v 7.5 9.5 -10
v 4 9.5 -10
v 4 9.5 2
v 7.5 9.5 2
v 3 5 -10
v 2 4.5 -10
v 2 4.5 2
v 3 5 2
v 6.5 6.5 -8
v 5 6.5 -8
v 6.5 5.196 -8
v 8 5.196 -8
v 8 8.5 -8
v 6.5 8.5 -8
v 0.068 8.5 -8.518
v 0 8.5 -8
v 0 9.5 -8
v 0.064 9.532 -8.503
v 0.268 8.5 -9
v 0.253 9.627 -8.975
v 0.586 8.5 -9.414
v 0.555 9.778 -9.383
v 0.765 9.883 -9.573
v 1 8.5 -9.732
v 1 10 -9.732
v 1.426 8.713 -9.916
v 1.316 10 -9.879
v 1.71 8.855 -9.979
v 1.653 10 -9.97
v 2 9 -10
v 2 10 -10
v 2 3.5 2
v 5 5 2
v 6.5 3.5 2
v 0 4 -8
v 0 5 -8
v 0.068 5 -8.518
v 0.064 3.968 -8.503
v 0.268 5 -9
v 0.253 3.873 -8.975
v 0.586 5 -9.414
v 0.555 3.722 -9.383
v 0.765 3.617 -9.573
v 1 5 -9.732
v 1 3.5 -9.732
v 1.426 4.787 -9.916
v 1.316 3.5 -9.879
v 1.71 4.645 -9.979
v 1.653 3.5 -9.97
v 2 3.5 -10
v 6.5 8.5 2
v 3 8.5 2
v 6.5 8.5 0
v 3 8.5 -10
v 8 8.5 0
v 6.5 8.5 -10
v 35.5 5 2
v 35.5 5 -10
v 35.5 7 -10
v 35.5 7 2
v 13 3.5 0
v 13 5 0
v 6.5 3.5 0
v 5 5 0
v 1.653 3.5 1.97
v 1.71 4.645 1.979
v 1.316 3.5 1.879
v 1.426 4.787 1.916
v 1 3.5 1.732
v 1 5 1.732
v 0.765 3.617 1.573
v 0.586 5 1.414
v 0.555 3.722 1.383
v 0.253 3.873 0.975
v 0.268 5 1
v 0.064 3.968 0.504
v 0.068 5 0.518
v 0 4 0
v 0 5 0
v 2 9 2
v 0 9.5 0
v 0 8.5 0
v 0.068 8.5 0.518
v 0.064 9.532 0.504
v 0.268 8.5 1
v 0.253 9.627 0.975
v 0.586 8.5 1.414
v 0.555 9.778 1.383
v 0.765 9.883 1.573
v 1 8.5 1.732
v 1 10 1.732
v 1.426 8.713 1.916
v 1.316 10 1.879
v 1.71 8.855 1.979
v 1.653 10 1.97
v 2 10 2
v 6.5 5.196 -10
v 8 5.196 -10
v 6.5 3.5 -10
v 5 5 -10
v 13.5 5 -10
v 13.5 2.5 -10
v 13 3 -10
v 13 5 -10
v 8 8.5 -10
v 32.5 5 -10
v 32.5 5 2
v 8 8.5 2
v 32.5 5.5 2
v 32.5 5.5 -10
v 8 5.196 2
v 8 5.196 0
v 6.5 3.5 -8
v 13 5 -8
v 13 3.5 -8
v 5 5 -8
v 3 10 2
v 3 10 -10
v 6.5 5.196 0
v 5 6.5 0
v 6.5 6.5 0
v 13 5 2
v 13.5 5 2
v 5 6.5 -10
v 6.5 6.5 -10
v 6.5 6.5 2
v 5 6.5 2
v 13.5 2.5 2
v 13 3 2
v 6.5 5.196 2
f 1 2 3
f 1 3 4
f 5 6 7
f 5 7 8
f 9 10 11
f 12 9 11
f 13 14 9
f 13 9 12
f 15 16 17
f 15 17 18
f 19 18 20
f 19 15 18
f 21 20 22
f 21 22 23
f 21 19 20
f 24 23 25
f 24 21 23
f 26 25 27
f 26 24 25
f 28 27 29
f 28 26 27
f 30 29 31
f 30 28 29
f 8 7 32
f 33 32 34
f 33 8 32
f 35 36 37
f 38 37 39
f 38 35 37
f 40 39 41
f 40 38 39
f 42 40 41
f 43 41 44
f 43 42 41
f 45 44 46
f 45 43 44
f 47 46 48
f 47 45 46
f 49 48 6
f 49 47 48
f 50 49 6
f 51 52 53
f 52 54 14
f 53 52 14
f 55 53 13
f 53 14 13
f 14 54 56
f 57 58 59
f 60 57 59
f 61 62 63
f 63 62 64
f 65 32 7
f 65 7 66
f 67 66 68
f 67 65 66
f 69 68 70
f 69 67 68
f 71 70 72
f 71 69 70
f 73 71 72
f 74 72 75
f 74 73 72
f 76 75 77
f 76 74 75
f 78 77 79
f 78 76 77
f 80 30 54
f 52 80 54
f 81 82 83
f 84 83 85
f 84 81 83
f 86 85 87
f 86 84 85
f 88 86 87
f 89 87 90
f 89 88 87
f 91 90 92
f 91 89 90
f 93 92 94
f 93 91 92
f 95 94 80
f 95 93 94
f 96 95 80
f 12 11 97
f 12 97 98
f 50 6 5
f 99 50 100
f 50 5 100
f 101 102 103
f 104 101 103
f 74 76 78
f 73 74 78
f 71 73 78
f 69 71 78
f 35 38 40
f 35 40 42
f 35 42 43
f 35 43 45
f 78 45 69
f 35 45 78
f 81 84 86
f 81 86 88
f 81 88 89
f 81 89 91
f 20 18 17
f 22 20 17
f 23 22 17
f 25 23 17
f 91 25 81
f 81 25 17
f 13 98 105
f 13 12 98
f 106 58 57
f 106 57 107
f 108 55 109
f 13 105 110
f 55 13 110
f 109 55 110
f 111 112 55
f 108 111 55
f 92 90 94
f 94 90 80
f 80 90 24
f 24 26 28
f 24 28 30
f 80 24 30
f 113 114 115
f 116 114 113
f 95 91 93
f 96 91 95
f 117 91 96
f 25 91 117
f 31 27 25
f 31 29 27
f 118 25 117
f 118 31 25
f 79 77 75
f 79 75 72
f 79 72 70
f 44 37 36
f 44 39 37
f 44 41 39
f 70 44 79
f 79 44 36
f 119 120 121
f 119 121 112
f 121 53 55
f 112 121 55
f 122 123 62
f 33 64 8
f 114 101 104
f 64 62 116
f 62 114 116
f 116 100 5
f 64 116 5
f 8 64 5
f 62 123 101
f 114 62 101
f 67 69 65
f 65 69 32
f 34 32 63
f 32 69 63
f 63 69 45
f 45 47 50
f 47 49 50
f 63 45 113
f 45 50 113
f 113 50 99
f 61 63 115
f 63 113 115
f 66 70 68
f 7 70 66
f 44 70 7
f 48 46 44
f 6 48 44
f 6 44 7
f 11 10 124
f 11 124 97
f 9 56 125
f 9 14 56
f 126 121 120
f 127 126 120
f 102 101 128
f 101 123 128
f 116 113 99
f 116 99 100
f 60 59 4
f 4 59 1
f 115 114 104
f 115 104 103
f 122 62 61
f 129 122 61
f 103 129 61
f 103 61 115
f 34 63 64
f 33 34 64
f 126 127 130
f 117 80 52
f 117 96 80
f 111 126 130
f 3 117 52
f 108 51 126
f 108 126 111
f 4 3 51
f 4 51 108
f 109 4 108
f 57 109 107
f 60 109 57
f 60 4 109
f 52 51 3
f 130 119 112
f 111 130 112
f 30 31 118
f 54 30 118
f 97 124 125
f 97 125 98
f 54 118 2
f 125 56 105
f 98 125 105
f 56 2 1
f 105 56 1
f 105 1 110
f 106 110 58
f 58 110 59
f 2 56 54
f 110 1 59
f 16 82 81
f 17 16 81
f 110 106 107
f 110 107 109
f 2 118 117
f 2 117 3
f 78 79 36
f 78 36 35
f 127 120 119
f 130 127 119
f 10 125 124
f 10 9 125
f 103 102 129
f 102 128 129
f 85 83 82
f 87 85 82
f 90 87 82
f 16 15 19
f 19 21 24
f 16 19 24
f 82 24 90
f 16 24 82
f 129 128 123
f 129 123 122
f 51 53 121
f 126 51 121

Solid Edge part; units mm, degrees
sketch "Sketch1" plane through (0, 0, 0) normal (0, 0, 1) x (1, 0, 0)
  line L0 (8, 8.5) -> (32.5, 5.5)
  line L1 (32.5, 5) -> (32.5, 5.5)
  line L2 (35.5, 5) -> (32.5, 5)
  line L3 (35.5, 5) -> (35.5, 7)
  line L4 (35.5, 7) -> (7.5, 9.5)
  line L5 (4, 9.5) -> (7.5, 9.5)
  line L6 (3, 10) -> (4, 9.5)
  line L7 (1, 10) -> (3, 10)
  line L8 (0, 9.5) -> (1, 10)
  line L9 (0, 8.5) -> (0, 9.5)
  line L10 (0, 8.5) -> (1, 8.5)
  line L11 (1, 8.5) -> (2, 9)
  line L12 (2, 9) -> (3, 8.5)
  line L13 (3, 8.5) -> (6.5, 8.5)
  line L14 (6.5, 8.5) -> (6.5, 6.5)
  line L15 (6.5, 6.5) -> (5, 6.5)
  line L16 (5, 6.5) -> (6.5, 5.1957)
  line L17 (6.5, 5.1957) -> (8, 5.1957)
  line L18 (8, 5.1957) -> (8, 8.5)
  line L19 (5, 5) -> (4, 5)
  line L20 (3, 5) -> (4, 5)
  line L21 (2, 4.5) -> (3, 5)
  line L22 (1, 5) -> (2, 4.5)
  line L23 (0, 5) -> (1, 5)
  line L24 (0, 5) -> (0, 4)
  line L25 (0, 4) -> (1, 3.5)
  line L26 (1, 3.5) -> (4, 3.5)
  line L27 (4, 3.5) -> (6.5, 3.5)
  line L28 (6.5, 3.5) -> (5, 5)
  line L29 (13.5, 5) -> (13.5, 2.5)
  line L30 (13.5, 2.5) -> (13, 3)
  line L31 (13, 3) -> (13, 5)
  line L32 (13, 5) -> (13.5, 5)
  dimension "D1" = 22
extrude "Protrusion1" add sketch "Sketch1" along normal blind 2
fillet "Round_2" radius 2 2 edges at (0, 9, 2) (0, 4.5, 2)
sketch "Sketch2" plane through (0, 0, 0) normal (0, 0, 1) x (1, 0, 0)
  line L0 (35.5, 7) -> (7.5, 9.5)
  line L1 (4, 9.5) -> (7.5, 9.5)
  line L2 (3, 10) -> (4, 9.5)
  line L3 (1, 10) -> (3, 10)
  line L4 (0, 9.5) -> (1, 10)
  line L5 (0, 8.5) -> (0, 9.5)
  line L6 (0, 8.5) -> (1, 8.5)
  line L7 (1, 8.5) -> (2, 9)
  line L8 (2, 9) -> (3, 8.5)
  line L9 (3, 8.5) -> (6.5, 8.5)
  line L10 (6.5, 8.5) -> (8, 8.5)
  line L11 (8, 8.5) -> (32.5, 5.5)
  line L12 (32.5, 5) -> (32.5, 5.5)
  line L13 (35.5, 5) -> (32.5, 5)
  line L14 (35.5, 5) -> (35.5, 7)
  line L15 (5, 5) -> (13, 5)
  line L16 (13, 5) -> (13.5, 5)
  line L17 (13.5, 5) -> (13.5, 2.5)
  line L18 (13.5, 2.5) -> (13, 3)
  line L19 (13, 3.5) -> (13, 3)
  line L20 (6.5, 3.5) -> (13, 3.5)
  line L21 (4, 3.5) -> (6.5, 3.5)
  line L22 (1, 3.5) -> (4, 3.5)
  line L23 (0, 4) -> (1, 3.5)
  line L24 (0, 5) -> (0, 4)
  line L25 (0, 5) -> (1, 5)
  line L26 (1, 5) -> (2, 4.5)
  line L27 (2, 4.5) -> (3, 5)
  line L28 (3, 5) -> (4, 5)
  line L29 (5, 5) -> (4, 5)
  dimension "D1" = 22
extrude "MidExtrusion" add sketch "Sketch2" against normal blind 8
sketch "Sketch3" plane through (0, 0, -8) normal (0, 0, 1) x (1, 0, 0)
  line L0 (8, 8.5) -> (32.5, 5.5)
  line L1 (32.5, 5.5) -> (32.5, 5)
  line L2 (32.5, 5) -> (35.5, 5)
  line L3 (35.5, 5) -> (35.5, 7)
  line L4 (35.5, 7) -> (7.5, 9.5)
  line L5 (7.5, 9.5) -> (4, 9.5)
  line L6 (4, 9.5) -> (3, 10)
  line L7 (3, 10) -> (1, 10)
  line L8 (1, 10) -> (0, 9.5)
  line L9 (0, 9.5) -> (0, 8.5)
  line L10 (0, 8.5) -> (1, 8.5)
  line L11 (1, 8.5) -> (2, 9)
  line L12 (2, 9) -> (3, 8.5)
  line L13 (3, 8.5) -> (6.5, 8.5)
  line L14 (6.5, 8.5) -> (6.5, 6.5)
  line L15 (6.5, 6.5) -> (5, 6.5)
  line L16 (5, 6.5) -> (6.5, 5.1957)
  line L17 (6.5, 5.1957) -> (8, 5.1957)
  line L18 (8, 5.1957) -> (8, 8.5)
  line L19 (5, 5) -> (3, 5)
  line L20 (3, 5) -> (2, 4.5)
  line L21 (2, 4.5) -> (1, 5)
  line L22 (1, 5) -> (0, 5)
  line L23 (0, 5) -> (0, 4)
  line L24 (0, 4) -> (1, 3.5)
  line L25 (1, 3.5) -> (6.5, 3.5)
  line L26 (6.5, 3.5) -> (5, 5)
  line L27 (13.5, 5) -> (13.5, 2.5)
  line L28 (13.5, 2.5) -> (13, 3)
  line L29 (13, 3) -> (13, 5)
  line L30 (13, 5) -> (13.5, 5)
extrude "Protrusion2" add sketch "Sketch3" against normal blind 2
fillet "Round_3" radius 2 2 edges at (0, 9, -10) (0, 4.5, -10)
